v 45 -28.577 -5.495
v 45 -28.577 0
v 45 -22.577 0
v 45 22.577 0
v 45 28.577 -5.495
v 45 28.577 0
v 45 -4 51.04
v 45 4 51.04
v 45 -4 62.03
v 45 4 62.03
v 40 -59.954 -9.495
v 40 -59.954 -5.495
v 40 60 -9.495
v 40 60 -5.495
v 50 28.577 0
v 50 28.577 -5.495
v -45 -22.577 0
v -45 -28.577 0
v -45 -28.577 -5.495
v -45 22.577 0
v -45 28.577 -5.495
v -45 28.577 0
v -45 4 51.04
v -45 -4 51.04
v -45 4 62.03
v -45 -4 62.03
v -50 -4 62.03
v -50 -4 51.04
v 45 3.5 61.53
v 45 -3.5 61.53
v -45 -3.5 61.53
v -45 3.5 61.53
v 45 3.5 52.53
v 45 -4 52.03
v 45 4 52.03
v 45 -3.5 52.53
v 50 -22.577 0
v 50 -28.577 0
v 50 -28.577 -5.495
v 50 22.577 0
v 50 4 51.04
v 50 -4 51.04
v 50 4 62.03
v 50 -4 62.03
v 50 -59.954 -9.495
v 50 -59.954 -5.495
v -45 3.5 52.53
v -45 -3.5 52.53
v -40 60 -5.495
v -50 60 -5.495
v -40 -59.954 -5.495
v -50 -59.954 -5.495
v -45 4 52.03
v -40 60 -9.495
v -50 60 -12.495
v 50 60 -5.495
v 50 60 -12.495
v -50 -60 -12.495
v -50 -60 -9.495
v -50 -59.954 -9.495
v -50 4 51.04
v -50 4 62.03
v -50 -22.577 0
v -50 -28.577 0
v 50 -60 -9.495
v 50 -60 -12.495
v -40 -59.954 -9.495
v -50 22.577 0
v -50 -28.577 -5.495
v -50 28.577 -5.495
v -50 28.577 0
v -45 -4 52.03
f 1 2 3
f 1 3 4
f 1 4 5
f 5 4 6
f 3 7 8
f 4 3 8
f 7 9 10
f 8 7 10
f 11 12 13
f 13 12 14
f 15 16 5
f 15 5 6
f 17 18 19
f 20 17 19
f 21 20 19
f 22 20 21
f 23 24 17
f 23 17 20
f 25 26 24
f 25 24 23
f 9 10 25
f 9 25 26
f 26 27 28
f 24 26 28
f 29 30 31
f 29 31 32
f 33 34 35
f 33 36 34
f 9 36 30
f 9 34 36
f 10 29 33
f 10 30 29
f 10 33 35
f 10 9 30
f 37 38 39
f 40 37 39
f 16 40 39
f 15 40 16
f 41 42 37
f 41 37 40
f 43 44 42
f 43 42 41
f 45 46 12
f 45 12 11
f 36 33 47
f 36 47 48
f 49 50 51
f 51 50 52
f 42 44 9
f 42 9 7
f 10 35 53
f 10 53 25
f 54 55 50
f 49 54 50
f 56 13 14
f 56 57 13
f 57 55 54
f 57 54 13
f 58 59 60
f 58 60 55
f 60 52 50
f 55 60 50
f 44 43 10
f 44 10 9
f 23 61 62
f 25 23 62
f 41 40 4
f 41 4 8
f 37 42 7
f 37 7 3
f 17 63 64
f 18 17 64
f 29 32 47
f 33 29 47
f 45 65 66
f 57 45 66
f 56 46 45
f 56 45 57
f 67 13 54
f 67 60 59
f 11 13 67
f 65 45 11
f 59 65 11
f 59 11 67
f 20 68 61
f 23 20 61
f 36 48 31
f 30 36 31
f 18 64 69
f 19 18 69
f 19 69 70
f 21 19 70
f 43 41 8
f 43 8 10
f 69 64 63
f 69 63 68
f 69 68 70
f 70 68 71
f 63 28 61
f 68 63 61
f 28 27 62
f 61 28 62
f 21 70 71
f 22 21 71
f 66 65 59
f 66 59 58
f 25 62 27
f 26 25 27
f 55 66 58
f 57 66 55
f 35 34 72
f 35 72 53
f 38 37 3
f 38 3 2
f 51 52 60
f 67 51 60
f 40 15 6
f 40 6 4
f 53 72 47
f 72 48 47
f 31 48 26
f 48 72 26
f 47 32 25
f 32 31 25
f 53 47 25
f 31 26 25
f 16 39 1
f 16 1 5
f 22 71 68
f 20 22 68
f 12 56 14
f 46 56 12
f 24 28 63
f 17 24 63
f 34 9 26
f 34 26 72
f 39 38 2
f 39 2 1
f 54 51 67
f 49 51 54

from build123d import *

# Parameters (mm, degrees)
F1_W     = 57.1539493034
F1_H     = 5
F2_DEPTH = 5
F3_DEPTH = 10
F4_DEPTH = 50
F7_DEPTH = 45


with BuildPart() as f2:
    # F1 (on offset) → F2 (new body)
    with BuildSketch(Plane.YZ.offset(-50)):
        Polygon((4, 51.0398183773), (4, 0), (22.5769746517, 0), align=None)
        Polygon((-22.5769746517, 0), (-4, 0), (-4, 51.0398183773), align=None)
        Polygon((-4, 0), (0, 0), (0, 52.0297280551), (-3.6397023427, 52.0297280551), (-4, 51.0398183773), align=None)
        Polygon((0, 52.0297280551), (0, 0), (4, 0), (4, 51.0398183773), (3.6397023427, 52.0297280551), align=None)
        Polygon((-3.6397023427, 52.0297280551), (0, 62.0297280551), (-4, 62.0297280551), (-4, 52.0297280551), align=None)
        Polygon((-3.6397023427, 52.0297280551), (0, 52.0297280551), (0, 62.0297280551), align=None)
        Polygon((4, 62.0297280551), (0, 62.0297280551), (3.6397023427, 52.0297280551), (4, 52.0297280551), align=None)
        Polygon((0, 62.0297280551), (0, 52.0297280551), (3.6397023427, 52.0297280551), align=None)
        Polygon((-4, 51.0398183773), (-3.6397023427, 52.0297280551), (-4, 52.0297280551), align=None)
        Polygon((4, 52.0297280551), (3.6397023427, 52.0297280551), (4, 51.0398183773), align=None)
        with Locations((0, -2.995375049)):
            Rectangle(F1_W, F1_H)
        Polygon((4, 0), (0, 0), (-4, 0), (-22.5769746517, 0), (-28.5769746517, 0), (-28.5769746517, -0.495375049), (28.5769746517, -0.495375049), (28.5769746517, 0), (22.5769746517, 0), align=None)
    extrude(amount=F2_DEPTH)


with BuildPart() as f3:
    # F1 (on offset) → F3 (new body)
    with BuildSketch(Plane.YZ.offset(-50)):
        Polygon((28.5769746517, -5.495375049), (-28.5769746517, -5.495375049), (-59.9543659465, -5.495375049), (-59.9543659465, -9.495375049), (60, -9.495375049), (60, -5.495375049), align=None)
    extrude(amount=F3_DEPTH)

    # F1 (on offset) → F4 (join)
    with BuildSketch(Plane.YZ.offset(-50)):
        Polygon((60, -9.495375049), (-59.9543659465, -9.495375049), (-60, -9.495375049), (-60, -12.4950279511), (60, -12.4950279511), align=None)
    extrude(amount=F4_DEPTH)

    # F9: F3 across plane


with BuildPart() as f7:
    # F6 (on offset) → F7 (new body)
    with BuildSketch(Plane.YZ.offset(-45)):
        Polygon((3.5, 52.5297280551), (4, 52.0297280551), (4, 57.0297280551), (3.5, 57.0297280551), align=None)
        Polygon((0, 52.0297280551), (4, 52.0297280551), (3.5, 52.5297280551), (0, 52.5297280551), align=None)
        Polygon((-4, 52.0297280551), (0, 52.0297280551), (0, 52.5297280551), (-3.5, 52.5297280551), align=None)
        Polygon((3.5, 57.0297280551), (4, 57.0297280551), (4, 62.0297280551), (3.5, 61.5297280551), align=None)
        Polygon((-4, 57.0297280551), (-4, 52.0297280551), (-3.5, 52.5297280551), (-3.5, 57.0297280551), align=None)
        Polygon((3.5, 61.5297280551), (4, 62.0297280551), (0, 62.0297280551), (0, 61.5297280551), align=None)
        Polygon((-4, 62.0297280551), (-4, 57.0297280551), (-3.5, 57.0297280551), (-3.5, 61.5297280551), align=None)
        Polygon((0, 61.5297280551), (0, 62.0297280551), (-4, 62.0297280551), (-3.5, 61.5297280551), align=None)
    extrude(amount=F7_DEPTH)

    # F10: F7 across plane


with BuildPart() as f8_1:
    # F8: instance of F2
    add(f2.part.mirror(Plane.YZ))


with BuildPart() as f3_1:
    add(f3.part)
    add(f3.part.mirror(Plane.YZ))


with BuildPart() as f7_1:
    add(f7.part)
    add(f7.part.mirror(Plane.YZ))


solid = Compound([f2.part, f8_1.part, f3_1.part, f7_1.part])
